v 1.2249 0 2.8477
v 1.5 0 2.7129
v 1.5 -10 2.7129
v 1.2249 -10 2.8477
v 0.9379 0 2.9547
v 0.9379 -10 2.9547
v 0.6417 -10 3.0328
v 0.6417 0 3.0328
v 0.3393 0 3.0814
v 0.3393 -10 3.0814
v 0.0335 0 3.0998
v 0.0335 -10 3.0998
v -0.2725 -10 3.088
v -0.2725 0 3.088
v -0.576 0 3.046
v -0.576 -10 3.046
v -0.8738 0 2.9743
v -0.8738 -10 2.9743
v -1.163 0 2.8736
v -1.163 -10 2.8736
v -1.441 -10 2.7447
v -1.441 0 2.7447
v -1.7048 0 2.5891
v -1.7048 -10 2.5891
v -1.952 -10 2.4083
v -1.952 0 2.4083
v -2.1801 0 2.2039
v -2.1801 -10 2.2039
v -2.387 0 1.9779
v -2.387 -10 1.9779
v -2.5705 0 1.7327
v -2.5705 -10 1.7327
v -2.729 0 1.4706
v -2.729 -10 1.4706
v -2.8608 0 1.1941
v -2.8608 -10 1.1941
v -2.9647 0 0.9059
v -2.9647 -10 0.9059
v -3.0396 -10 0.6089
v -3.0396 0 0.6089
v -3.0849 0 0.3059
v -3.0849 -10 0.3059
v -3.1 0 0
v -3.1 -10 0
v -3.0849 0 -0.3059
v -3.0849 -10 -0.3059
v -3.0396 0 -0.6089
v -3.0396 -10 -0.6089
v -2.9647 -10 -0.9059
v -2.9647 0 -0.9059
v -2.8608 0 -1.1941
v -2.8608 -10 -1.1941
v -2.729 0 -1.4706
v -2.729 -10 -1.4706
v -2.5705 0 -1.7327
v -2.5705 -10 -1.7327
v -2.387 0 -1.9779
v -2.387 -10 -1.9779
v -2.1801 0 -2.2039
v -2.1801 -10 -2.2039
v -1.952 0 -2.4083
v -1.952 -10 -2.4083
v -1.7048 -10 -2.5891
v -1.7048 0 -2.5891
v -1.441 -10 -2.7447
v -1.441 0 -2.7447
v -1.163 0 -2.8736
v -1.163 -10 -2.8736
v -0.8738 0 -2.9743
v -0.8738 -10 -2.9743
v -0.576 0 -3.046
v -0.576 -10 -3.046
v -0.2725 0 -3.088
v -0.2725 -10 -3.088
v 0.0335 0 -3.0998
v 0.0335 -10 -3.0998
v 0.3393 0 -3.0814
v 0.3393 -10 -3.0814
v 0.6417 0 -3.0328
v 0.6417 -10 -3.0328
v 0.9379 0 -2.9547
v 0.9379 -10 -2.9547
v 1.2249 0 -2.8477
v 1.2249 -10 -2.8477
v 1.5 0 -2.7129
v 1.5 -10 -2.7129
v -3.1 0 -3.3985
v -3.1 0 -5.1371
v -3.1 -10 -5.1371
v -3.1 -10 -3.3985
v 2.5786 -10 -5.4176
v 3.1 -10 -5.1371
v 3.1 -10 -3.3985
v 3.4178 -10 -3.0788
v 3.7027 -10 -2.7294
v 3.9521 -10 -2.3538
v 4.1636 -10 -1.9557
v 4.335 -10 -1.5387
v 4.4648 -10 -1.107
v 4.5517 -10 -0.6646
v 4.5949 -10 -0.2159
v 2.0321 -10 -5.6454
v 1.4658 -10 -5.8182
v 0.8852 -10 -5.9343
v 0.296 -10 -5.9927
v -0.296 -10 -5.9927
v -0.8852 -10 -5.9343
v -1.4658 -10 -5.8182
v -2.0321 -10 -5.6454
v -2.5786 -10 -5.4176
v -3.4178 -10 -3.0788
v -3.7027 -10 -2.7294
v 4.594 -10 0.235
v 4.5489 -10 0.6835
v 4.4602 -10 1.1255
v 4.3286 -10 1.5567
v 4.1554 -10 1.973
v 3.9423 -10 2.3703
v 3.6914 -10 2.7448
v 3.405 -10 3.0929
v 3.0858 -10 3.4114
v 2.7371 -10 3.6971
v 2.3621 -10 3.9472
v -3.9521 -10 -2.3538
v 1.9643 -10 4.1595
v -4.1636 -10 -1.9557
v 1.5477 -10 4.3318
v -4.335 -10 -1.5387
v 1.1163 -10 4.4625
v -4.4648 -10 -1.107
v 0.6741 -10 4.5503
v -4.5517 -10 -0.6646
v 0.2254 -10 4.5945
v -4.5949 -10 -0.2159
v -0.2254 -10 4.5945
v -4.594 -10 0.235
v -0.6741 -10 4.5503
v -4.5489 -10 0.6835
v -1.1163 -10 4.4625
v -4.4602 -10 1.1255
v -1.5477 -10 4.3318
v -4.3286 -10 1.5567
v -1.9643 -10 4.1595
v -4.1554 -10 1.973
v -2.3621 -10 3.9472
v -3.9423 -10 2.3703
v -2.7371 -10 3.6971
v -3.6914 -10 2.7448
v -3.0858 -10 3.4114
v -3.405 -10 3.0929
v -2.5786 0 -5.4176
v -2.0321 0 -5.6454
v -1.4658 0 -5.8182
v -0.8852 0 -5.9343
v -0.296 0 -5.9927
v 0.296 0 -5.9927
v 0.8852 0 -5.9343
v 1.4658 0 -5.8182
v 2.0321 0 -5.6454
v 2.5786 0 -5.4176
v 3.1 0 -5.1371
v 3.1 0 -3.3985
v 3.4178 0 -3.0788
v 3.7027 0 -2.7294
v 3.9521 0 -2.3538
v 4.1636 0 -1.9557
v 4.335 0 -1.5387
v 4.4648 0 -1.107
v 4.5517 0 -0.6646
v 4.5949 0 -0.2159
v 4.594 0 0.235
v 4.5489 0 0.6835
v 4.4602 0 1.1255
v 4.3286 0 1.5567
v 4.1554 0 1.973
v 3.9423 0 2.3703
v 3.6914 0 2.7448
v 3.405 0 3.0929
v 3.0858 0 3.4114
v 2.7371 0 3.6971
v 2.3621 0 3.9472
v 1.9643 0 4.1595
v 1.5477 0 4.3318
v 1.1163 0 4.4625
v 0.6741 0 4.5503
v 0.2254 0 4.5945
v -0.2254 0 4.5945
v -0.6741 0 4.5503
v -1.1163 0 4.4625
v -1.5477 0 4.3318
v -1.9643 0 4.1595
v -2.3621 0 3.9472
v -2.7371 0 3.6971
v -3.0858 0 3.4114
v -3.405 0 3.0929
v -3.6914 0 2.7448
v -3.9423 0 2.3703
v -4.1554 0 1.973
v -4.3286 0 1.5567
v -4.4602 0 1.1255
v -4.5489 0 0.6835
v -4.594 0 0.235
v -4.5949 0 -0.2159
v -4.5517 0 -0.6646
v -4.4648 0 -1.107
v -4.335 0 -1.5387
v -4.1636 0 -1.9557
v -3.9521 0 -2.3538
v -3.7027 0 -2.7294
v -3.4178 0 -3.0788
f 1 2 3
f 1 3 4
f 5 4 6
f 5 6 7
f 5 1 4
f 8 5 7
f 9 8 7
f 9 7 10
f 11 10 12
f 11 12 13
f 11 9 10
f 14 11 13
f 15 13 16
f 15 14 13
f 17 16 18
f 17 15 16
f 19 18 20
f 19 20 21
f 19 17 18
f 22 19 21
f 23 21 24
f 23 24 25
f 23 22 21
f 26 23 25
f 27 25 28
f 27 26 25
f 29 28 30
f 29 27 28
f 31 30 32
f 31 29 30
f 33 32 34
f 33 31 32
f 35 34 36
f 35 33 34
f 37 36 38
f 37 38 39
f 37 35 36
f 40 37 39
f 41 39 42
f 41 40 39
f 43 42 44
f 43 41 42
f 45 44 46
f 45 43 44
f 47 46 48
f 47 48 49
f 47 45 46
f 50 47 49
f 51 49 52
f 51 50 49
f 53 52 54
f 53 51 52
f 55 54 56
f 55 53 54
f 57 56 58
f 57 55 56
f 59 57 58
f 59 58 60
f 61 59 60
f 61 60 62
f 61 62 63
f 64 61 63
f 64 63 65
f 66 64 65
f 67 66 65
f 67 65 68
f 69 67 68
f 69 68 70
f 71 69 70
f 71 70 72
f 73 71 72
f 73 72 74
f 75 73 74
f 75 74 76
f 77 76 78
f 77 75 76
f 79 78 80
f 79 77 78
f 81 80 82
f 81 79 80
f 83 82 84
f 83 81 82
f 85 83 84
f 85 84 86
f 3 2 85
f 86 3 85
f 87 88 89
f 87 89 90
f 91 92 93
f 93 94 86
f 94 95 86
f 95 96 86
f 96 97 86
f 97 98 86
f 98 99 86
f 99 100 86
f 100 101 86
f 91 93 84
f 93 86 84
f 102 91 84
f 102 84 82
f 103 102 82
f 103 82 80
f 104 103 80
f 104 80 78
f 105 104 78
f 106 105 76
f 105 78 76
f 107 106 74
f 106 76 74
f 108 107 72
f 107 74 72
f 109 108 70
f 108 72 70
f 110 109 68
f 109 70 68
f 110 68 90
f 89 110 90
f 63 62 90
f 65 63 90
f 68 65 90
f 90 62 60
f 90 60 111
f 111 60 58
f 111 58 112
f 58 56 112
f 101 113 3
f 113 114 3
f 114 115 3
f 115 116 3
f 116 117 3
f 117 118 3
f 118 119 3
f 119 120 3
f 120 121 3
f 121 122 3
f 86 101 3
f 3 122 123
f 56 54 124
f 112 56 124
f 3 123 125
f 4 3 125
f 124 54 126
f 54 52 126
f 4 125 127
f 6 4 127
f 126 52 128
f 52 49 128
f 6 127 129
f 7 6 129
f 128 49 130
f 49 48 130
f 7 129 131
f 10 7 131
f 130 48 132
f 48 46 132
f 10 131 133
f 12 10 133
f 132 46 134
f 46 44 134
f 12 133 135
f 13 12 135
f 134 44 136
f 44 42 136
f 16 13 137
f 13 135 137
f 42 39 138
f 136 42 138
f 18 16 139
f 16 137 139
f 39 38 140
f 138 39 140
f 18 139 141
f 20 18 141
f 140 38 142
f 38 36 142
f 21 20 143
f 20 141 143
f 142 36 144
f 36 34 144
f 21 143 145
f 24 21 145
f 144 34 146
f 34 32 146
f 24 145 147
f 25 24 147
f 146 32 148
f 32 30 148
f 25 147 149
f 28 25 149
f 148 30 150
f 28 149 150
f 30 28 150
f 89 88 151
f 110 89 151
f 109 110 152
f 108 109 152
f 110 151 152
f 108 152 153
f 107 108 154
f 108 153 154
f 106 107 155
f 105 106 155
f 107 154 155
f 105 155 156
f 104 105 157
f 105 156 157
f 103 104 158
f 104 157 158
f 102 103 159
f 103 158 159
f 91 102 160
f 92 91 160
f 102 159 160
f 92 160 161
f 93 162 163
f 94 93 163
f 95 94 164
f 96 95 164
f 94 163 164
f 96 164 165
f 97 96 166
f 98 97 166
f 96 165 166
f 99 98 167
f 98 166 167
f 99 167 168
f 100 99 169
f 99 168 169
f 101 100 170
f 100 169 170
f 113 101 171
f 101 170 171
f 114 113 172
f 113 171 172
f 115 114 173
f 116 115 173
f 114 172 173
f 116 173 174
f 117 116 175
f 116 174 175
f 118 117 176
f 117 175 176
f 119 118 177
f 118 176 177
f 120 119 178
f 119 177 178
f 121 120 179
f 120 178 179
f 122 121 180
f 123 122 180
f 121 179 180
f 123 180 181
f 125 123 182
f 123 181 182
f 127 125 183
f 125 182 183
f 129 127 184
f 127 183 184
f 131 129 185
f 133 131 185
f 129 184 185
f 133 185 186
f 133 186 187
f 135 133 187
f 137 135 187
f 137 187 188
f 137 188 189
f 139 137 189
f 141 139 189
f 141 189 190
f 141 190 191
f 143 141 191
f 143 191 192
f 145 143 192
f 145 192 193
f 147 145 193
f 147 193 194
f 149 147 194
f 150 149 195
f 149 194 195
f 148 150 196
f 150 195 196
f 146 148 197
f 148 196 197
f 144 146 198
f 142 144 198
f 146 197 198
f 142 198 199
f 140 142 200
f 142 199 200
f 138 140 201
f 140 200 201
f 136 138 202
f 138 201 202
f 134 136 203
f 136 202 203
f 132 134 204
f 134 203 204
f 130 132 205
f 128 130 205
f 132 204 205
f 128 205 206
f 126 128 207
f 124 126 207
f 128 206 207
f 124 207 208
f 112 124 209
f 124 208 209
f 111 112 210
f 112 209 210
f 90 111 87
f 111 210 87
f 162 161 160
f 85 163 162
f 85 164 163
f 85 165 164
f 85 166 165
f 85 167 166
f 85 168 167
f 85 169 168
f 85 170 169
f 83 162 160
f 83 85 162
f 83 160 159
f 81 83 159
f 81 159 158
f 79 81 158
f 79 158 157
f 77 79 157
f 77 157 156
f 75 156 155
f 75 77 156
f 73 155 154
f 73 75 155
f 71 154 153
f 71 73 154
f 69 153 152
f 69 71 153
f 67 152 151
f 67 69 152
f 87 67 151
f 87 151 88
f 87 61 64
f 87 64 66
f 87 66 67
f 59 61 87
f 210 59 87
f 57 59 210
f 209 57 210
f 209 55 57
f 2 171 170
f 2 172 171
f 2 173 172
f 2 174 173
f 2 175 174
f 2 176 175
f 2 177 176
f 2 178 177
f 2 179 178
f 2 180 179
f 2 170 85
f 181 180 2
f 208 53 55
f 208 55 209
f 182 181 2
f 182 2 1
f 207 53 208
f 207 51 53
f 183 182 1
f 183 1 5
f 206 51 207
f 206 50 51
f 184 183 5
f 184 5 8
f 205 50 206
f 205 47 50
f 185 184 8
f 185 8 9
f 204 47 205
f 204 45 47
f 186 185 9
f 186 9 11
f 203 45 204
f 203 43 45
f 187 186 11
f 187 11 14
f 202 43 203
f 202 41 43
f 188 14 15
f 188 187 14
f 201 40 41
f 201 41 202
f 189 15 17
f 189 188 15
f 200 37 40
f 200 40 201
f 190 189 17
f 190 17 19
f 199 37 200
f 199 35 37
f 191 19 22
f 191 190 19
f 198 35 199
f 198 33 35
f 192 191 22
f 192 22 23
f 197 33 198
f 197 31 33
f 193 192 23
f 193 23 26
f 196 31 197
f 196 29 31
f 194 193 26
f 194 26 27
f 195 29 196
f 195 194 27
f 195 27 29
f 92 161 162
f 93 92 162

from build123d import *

# Parameters (mm, degrees)
PAD_DEPTH = 10


with BuildPart() as part:
    # Sketch → Pad (new body)
    with BuildSketch(Plane.XZ):
        with BuildLine():
            Line((-3.1, -5.13712), (-3.1, -3.398529))
            ThreePointArc((3.1, -3.398529), (0, 4.6), (-3.1, -3.398529))
            Line((3.1, -5.13712), (3.1, -3.398529))
            ThreePointArc((-3.1, -5.13712), (0, -6), (3.1, -5.13712))
        make_face()
        with BuildLine():
            Line((1.5, 2.712932), (1.5, -2.712932))
            ThreePointArc((1.5, 2.712932), (-3.1, 0), (1.5, -2.712932))
        make_face(mode=Mode.SUBTRACT)
    extrude(amount=PAD_DEPTH)


solid = part.part
